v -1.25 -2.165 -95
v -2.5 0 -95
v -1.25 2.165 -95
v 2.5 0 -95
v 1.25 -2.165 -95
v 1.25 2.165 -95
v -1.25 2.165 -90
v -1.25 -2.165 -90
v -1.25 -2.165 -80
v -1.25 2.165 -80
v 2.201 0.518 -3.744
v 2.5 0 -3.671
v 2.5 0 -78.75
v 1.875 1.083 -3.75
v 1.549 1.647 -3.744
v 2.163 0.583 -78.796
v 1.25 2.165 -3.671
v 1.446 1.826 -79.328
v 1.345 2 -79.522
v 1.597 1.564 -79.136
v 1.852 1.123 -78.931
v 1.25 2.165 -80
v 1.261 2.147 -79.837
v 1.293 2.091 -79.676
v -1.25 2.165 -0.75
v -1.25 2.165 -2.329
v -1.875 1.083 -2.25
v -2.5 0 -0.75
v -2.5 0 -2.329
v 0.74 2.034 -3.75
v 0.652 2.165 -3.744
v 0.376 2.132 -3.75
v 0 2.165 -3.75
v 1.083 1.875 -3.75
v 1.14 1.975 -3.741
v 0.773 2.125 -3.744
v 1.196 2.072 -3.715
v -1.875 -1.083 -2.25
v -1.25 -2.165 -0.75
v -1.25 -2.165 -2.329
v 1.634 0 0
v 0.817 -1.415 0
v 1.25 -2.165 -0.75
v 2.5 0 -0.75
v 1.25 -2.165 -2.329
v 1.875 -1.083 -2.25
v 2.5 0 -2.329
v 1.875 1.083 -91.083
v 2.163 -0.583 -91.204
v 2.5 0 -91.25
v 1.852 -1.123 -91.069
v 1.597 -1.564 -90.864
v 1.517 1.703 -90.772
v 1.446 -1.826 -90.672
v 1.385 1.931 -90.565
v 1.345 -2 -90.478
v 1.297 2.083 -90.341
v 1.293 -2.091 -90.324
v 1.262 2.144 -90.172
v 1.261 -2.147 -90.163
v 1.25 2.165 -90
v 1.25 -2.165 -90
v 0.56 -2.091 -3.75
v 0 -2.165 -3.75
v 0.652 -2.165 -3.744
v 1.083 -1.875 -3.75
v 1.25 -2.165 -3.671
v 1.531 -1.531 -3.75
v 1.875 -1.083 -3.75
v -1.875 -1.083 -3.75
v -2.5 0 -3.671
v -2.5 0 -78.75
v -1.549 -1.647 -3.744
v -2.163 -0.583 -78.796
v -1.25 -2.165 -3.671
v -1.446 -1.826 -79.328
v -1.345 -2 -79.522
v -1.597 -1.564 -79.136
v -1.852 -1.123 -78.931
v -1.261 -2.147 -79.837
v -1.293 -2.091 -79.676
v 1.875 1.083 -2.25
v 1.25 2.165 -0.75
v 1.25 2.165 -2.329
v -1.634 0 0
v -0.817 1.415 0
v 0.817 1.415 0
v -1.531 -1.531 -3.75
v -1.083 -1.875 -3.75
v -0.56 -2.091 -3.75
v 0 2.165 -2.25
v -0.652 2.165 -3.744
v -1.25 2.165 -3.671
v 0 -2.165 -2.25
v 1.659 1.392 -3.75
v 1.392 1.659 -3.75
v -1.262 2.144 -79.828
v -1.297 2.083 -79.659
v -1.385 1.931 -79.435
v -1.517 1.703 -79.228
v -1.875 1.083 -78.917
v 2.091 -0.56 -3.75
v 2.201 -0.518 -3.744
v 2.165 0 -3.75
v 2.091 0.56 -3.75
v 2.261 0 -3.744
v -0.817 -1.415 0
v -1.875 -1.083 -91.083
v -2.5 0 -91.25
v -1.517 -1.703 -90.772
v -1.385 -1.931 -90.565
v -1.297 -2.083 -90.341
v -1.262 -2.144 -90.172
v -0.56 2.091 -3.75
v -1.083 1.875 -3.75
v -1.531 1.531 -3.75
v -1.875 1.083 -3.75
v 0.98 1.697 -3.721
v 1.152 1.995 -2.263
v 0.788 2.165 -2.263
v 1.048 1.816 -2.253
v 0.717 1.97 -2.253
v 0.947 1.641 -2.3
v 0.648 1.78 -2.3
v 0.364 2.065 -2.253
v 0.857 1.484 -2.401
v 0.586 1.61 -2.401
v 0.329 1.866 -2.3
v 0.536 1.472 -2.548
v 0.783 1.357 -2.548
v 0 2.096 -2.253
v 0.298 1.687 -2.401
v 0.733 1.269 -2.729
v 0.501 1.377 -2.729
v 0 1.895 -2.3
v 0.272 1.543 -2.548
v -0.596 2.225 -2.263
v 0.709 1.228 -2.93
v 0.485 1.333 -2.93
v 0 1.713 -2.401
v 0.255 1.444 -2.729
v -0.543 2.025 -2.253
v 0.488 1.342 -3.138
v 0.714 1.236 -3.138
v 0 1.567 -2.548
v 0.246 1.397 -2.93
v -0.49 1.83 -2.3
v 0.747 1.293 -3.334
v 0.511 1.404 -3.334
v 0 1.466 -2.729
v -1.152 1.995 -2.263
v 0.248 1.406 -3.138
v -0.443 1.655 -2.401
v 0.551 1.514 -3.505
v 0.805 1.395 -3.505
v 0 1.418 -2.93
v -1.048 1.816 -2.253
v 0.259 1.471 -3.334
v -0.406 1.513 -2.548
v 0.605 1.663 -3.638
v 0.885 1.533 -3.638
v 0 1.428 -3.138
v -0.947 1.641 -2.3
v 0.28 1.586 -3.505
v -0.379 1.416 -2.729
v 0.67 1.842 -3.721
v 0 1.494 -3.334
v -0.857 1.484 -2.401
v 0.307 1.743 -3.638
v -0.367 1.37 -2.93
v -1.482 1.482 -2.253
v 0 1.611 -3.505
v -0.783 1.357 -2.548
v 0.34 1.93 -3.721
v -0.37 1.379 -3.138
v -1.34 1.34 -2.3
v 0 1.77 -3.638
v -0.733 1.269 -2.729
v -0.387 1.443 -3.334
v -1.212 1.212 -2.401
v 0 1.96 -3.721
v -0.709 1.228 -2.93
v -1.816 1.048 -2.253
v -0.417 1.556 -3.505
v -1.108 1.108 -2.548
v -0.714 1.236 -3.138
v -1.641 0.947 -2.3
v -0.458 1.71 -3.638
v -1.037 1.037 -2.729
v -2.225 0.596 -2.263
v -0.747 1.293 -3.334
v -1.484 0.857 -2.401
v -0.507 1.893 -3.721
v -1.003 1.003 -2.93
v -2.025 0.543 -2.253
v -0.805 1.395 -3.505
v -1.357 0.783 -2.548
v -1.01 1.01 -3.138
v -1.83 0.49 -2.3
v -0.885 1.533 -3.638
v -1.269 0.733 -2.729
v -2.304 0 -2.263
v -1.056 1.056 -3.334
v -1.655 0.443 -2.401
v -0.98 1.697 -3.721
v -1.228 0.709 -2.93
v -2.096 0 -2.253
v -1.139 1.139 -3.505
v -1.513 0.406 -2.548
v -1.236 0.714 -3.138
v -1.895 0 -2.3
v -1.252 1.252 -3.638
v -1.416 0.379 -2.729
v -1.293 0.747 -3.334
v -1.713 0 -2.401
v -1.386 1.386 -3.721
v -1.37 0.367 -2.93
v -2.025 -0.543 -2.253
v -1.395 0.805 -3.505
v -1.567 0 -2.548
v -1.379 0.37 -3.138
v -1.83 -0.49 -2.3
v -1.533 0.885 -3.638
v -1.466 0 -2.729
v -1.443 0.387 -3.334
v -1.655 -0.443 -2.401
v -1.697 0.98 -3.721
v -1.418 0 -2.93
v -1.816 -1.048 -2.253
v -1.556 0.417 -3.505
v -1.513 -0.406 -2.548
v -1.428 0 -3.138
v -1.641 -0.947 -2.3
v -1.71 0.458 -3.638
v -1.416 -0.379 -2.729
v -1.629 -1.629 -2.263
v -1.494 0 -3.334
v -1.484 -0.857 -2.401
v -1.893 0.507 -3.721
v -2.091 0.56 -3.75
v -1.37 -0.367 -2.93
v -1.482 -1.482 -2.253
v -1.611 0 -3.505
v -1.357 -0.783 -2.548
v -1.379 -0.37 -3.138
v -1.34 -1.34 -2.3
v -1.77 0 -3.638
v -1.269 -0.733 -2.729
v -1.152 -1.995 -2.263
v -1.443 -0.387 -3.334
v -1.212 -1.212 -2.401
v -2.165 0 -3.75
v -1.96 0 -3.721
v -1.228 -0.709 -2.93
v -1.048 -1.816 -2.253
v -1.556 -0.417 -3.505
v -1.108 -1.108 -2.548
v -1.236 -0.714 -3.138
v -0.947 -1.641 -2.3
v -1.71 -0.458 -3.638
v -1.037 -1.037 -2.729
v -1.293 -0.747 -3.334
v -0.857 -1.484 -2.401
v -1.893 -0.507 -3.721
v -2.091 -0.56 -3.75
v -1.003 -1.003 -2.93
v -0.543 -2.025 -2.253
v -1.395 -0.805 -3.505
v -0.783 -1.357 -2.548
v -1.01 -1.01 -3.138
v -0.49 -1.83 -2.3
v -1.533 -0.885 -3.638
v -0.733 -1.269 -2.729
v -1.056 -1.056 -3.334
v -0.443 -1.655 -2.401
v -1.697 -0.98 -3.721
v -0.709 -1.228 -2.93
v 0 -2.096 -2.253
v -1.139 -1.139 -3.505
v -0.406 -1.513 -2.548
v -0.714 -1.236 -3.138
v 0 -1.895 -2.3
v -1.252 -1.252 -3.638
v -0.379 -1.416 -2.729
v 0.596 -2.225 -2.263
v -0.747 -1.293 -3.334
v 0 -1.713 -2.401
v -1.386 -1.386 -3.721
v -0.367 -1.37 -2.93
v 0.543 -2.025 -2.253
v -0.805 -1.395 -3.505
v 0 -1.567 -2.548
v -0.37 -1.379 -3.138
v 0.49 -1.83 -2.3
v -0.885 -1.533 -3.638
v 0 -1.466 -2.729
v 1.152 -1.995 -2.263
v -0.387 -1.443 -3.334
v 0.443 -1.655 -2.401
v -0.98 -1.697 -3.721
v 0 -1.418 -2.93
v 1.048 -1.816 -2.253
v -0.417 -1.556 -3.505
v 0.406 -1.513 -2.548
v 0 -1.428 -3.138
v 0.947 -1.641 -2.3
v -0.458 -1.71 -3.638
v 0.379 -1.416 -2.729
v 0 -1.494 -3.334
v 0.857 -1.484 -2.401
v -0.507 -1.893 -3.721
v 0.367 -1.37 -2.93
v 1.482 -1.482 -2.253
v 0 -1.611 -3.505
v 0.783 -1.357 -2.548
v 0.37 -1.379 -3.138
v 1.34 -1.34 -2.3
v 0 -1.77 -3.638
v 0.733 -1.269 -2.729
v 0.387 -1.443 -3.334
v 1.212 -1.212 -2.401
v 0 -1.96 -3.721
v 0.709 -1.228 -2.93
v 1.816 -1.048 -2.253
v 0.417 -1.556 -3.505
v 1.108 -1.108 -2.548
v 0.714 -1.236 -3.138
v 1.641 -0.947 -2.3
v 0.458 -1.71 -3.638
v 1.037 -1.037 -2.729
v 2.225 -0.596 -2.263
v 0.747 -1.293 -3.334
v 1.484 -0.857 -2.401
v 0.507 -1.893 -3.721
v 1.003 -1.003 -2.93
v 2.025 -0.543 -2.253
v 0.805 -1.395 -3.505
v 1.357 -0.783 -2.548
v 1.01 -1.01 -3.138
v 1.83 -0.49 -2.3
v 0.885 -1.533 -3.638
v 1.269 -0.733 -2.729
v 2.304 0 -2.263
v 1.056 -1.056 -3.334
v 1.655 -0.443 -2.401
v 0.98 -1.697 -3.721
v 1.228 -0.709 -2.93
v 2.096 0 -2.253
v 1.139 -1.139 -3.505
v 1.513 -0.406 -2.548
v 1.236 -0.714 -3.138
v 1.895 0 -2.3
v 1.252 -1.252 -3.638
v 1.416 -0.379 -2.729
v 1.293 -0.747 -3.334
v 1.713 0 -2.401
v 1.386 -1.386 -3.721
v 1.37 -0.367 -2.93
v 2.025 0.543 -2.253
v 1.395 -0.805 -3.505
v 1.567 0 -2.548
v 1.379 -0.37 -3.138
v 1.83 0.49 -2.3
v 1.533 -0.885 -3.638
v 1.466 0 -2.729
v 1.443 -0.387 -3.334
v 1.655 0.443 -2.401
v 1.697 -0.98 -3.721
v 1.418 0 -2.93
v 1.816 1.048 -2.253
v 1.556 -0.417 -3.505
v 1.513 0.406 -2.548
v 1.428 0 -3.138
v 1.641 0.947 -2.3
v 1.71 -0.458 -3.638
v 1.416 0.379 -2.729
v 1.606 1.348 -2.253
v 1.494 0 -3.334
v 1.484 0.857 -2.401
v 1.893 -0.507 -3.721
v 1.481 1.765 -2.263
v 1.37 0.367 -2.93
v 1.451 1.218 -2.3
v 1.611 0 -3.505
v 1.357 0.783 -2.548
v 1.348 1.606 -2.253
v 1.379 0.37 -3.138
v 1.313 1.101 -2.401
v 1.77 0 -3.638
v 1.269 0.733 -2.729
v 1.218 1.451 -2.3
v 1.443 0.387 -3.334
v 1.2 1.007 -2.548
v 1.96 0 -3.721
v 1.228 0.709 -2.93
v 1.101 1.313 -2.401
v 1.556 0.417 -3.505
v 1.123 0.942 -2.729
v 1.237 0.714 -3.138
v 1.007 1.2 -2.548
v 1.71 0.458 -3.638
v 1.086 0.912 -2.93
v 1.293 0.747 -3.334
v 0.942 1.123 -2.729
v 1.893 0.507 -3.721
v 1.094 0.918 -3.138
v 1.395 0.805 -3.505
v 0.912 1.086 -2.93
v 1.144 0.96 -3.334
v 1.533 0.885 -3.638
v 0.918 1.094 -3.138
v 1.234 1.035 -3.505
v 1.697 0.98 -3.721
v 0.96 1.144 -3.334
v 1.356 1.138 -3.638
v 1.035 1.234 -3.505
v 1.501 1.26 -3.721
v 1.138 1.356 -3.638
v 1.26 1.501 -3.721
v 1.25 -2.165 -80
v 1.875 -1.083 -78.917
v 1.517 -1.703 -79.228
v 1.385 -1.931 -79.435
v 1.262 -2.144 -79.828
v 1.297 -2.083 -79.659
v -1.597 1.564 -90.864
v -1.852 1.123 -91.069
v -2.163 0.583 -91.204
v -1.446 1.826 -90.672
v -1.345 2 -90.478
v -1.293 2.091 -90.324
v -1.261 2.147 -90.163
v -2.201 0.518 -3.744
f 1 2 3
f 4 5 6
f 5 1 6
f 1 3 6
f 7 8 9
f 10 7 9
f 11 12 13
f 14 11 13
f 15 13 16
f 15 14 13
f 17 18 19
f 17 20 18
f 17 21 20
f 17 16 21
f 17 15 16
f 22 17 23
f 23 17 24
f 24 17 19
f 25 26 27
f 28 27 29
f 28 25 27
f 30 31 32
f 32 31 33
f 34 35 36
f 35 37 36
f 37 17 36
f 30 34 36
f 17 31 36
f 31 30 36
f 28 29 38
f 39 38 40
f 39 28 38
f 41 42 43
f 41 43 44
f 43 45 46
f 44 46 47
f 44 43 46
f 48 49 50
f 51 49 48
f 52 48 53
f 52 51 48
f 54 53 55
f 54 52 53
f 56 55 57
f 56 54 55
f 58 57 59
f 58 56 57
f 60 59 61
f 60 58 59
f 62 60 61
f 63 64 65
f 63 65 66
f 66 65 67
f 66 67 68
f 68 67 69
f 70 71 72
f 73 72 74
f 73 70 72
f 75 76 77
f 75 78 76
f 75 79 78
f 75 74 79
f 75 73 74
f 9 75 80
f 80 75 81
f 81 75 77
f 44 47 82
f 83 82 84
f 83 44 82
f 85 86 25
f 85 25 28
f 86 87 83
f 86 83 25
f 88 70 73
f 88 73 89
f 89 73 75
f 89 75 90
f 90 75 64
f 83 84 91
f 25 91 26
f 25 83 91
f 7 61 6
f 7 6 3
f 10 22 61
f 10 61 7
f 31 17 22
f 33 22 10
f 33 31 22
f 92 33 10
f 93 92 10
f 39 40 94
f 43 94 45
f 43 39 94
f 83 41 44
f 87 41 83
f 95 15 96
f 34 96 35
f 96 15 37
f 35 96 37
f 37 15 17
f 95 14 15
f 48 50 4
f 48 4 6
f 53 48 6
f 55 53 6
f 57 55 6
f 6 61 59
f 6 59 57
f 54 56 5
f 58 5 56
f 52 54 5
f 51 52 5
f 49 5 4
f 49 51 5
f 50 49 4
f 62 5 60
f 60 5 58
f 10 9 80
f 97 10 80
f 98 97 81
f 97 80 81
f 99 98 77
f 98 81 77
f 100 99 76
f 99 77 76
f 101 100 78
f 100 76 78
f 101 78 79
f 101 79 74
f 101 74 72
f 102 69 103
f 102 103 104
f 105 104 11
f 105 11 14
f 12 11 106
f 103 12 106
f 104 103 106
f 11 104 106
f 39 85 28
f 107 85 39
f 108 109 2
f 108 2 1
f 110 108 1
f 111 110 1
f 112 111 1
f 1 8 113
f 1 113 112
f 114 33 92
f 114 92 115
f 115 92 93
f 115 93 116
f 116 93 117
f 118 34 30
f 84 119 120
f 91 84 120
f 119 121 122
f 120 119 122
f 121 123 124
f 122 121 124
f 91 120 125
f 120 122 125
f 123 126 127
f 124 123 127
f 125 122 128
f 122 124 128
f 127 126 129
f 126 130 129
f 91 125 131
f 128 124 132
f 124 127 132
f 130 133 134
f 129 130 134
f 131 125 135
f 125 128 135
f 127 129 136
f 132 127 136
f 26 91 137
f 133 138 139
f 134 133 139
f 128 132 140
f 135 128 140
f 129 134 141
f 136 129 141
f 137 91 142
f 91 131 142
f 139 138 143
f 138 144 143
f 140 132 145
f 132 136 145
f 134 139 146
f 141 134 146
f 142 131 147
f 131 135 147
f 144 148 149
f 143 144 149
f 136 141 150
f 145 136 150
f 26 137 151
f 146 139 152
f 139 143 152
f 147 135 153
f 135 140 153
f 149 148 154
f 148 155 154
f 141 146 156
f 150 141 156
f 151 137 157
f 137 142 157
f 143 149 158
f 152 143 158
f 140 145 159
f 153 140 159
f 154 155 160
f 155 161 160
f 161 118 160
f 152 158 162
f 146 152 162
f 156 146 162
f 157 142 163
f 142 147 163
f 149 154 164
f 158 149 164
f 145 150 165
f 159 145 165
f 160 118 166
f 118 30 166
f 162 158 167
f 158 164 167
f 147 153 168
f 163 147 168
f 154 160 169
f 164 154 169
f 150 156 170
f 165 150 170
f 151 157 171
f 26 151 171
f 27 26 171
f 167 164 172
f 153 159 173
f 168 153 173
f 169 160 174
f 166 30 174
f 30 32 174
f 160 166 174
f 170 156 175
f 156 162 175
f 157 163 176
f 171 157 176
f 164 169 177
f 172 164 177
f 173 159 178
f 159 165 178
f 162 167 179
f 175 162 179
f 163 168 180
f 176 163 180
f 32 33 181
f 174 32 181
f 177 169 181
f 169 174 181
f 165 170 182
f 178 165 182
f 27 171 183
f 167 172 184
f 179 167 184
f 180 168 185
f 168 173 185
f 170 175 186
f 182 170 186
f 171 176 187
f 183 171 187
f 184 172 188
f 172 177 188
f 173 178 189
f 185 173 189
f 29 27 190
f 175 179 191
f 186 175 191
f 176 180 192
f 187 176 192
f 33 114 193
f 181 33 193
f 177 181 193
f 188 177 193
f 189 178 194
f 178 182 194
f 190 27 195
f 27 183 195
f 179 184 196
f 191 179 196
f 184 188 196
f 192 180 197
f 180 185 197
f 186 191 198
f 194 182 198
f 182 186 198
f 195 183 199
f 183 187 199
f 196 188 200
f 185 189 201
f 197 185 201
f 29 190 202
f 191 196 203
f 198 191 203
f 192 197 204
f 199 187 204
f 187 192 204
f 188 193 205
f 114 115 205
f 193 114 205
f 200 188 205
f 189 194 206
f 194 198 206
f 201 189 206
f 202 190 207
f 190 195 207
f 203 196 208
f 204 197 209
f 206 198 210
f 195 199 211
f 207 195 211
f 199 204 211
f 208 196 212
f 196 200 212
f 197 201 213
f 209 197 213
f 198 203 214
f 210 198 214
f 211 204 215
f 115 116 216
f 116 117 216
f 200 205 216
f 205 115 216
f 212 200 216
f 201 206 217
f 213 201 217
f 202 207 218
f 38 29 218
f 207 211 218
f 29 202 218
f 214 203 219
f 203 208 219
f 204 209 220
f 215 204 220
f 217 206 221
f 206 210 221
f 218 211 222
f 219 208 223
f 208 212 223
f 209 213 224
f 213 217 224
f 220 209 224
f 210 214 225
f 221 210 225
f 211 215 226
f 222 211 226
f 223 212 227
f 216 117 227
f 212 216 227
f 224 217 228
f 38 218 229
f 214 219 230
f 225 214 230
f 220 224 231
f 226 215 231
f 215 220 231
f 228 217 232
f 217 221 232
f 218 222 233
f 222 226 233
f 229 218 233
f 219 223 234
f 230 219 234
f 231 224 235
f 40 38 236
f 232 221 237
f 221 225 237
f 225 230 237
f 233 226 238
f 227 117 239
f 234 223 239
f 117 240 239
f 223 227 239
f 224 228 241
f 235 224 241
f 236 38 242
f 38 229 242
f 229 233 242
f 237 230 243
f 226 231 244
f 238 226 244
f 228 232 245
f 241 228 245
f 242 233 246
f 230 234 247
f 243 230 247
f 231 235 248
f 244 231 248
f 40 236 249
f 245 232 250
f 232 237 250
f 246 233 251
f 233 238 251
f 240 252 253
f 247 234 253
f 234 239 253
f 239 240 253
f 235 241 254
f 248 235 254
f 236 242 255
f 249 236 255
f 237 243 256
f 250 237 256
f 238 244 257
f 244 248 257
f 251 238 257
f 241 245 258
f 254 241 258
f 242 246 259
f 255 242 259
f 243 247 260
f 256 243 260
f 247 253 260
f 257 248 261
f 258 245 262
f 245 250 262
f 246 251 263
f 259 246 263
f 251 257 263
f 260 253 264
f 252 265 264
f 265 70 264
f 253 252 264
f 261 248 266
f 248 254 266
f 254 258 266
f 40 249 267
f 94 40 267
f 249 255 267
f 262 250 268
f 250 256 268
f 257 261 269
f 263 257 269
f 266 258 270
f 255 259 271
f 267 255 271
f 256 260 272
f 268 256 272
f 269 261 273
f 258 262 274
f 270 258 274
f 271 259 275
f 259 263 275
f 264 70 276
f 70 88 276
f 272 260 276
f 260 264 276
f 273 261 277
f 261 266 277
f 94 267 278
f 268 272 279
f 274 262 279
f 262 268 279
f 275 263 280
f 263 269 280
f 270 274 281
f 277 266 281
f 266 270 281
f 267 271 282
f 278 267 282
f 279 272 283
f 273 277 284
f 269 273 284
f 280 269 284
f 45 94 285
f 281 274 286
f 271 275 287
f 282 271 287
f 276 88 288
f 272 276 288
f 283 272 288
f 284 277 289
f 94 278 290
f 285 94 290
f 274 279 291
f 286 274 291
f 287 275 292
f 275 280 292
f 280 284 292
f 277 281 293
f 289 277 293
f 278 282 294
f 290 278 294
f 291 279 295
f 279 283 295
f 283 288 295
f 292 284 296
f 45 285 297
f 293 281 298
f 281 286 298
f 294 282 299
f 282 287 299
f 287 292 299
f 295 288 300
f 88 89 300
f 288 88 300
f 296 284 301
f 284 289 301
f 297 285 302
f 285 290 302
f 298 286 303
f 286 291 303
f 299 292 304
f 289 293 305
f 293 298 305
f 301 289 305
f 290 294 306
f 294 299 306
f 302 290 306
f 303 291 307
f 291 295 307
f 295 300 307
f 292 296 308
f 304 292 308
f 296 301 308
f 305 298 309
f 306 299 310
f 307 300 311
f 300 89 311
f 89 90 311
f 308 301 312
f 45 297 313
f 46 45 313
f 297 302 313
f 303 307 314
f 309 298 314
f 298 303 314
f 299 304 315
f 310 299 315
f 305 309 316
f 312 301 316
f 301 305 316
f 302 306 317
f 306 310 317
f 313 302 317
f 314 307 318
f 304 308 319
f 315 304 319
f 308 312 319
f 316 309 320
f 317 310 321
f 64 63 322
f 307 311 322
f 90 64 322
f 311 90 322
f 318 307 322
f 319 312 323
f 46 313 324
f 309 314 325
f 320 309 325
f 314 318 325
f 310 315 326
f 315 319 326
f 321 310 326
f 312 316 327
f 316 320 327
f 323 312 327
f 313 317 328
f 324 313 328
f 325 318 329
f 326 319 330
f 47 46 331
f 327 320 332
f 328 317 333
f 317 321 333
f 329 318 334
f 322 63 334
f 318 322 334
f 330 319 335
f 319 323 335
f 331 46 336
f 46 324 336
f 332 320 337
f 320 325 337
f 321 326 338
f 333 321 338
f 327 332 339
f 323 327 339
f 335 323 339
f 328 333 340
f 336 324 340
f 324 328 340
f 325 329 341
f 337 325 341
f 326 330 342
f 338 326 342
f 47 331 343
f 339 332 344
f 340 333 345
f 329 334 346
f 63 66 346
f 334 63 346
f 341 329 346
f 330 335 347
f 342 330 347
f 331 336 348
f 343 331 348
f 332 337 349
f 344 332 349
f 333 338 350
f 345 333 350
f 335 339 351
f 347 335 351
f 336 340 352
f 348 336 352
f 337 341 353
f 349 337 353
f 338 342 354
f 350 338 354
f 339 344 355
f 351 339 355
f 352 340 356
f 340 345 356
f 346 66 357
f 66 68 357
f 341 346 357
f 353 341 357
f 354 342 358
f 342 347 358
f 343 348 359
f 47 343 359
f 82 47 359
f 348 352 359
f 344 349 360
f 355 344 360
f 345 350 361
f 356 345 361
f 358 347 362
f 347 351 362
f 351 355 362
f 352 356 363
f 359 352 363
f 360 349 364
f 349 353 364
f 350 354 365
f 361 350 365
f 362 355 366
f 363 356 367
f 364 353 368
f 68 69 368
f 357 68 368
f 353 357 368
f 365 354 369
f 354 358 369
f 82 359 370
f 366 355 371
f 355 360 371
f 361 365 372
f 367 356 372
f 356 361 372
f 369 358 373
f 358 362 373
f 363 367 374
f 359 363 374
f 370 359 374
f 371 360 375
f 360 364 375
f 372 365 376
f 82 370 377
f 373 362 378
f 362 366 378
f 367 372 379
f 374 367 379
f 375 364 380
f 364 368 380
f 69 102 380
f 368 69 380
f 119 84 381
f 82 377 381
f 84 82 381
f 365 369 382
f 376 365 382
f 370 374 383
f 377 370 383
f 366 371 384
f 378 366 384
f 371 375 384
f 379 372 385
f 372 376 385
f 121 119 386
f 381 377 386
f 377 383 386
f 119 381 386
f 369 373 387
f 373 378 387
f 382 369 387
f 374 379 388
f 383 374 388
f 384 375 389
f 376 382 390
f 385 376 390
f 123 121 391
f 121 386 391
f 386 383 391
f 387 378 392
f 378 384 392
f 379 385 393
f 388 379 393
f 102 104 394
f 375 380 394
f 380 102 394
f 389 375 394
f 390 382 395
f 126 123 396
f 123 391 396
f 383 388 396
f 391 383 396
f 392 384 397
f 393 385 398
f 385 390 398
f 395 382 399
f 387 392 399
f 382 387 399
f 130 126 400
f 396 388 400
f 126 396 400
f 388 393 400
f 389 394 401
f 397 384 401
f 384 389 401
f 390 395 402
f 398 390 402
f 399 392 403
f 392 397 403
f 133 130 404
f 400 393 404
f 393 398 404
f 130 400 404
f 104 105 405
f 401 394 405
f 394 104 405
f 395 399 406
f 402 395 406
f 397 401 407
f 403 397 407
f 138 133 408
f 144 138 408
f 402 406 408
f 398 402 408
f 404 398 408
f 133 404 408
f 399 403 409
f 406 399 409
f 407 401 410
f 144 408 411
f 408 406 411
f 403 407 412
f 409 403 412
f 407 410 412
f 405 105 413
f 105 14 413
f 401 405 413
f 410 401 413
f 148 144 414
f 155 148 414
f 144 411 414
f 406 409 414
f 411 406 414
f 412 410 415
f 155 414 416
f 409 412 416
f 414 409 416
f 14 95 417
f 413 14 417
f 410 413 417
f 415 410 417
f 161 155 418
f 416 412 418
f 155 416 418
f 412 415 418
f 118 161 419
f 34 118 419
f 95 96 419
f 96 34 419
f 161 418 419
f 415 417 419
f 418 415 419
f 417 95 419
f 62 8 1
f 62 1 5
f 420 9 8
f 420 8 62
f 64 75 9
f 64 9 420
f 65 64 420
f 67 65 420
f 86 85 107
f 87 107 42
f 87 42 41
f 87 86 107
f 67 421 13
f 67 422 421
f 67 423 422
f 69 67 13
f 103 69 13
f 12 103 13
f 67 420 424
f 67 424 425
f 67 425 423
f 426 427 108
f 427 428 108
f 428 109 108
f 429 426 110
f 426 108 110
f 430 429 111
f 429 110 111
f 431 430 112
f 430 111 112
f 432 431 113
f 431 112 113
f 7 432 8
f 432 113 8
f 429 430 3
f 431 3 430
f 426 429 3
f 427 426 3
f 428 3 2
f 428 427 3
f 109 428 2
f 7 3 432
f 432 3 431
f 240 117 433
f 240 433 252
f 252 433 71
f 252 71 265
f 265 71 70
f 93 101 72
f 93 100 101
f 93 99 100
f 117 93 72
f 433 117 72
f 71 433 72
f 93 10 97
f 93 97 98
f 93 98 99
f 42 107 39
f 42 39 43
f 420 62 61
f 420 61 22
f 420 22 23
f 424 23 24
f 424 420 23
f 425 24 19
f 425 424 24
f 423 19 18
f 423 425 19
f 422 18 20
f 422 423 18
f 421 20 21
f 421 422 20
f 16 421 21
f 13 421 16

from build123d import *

# Parameters (mm, degrees)
SALIENTE_EXTRUIR1_DEPTH    = 95
CHAFL_N1_SIZE              = 0.75
CROQUIS2_R                 = 0.75
CORTAR_EXTRUIR1_DEPTH      = 96.057548464
CORTAR_EXTRUIR1_DEPTH_BACK = 96.057548464


with BuildPart() as part:
    # Croquis1 → Saliente-Extruir1 (new body)
    with BuildSketch(Plane.XY):
        Polygon((1.25, -2.165063509), (2.5, 0), (1.25, 2.165063509), (-1.25, 2.165063509), (-2.5, 0), (-1.25, -2.165063509), align=None)
    extrude(amount=-SALIENTE_EXTRUIR1_DEPTH)

    # Chaflán1
    chafl_n1_edges = [part.edges().sort_by_distance(p)[0] for p in [
        (-1.875, -1.082531755, 0),
        (-1.875, 1.082531755, 0),
        (0, 2.165063509, 0),
        (1.875, 1.082531755, 0),
        (1.875, -1.082531755, 0),
        (0, -2.165063509, 0),
    ]]
    chamfer(chafl_n1_edges, length=CHAFL_N1_SIZE)

    # Croquis2 → Cortar-Revolución1 (revolve, cut)
    with BuildSketch(Plane(origin=(0, 0, 0), x_dir=(0, 0, -1), z_dir=(1, 0, 0)), mode=Mode.PRIVATE) as cortar_revoluci_n1_sk:
        with Locations((3, 2.165063509)):
            Circle(CROQUIS2_R)
    revolve(cortar_revoluci_n1_sk.sketch.rotate(Axis((0, 0, 0), (0, 0, 1)), 329.999999874), axis=Axis((0, 0, 0), (0, 0, 1)), mode=Mode.SUBTRACT)

    # Croquis5 → Cortar-Extruir1 (cut, two sides: drawn at the far end of the back side and taken through both)
    with BuildSketch(Plane(origin=(0, 0, 0), x_dir=(1, 0, 0), z_dir=(0, 1, 0)).offset(-CORTAR_EXTRUIR1_DEPTH_BACK)):
        with BuildLine():
            Line((-1.25, 90), (-1.25, 80))
            ThreePointArc((-1.25, 80), (-2.5, 78.75), (-3.75, 80))
            Line((-3.75, 80), (-3.75, 90))
            ThreePointArc((-3.75, 90), (-2.5, 91.25), (-1.25, 90))
        make_face()
        with BuildLine():
            Line((1.25, 90), (1.25, 80))
            ThreePointArc((1.25, 80), (2.5, 78.75), (3.75, 80))
            Line((3.75, 80), (3.75, 90))
            ThreePointArc((3.75, 90), (2.5, 91.25), (1.25, 90))
        make_face()
    extrude(amount=CORTAR_EXTRUIR1_DEPTH + CORTAR_EXTRUIR1_DEPTH_BACK, mode=Mode.SUBTRACT)


solid = part.part
